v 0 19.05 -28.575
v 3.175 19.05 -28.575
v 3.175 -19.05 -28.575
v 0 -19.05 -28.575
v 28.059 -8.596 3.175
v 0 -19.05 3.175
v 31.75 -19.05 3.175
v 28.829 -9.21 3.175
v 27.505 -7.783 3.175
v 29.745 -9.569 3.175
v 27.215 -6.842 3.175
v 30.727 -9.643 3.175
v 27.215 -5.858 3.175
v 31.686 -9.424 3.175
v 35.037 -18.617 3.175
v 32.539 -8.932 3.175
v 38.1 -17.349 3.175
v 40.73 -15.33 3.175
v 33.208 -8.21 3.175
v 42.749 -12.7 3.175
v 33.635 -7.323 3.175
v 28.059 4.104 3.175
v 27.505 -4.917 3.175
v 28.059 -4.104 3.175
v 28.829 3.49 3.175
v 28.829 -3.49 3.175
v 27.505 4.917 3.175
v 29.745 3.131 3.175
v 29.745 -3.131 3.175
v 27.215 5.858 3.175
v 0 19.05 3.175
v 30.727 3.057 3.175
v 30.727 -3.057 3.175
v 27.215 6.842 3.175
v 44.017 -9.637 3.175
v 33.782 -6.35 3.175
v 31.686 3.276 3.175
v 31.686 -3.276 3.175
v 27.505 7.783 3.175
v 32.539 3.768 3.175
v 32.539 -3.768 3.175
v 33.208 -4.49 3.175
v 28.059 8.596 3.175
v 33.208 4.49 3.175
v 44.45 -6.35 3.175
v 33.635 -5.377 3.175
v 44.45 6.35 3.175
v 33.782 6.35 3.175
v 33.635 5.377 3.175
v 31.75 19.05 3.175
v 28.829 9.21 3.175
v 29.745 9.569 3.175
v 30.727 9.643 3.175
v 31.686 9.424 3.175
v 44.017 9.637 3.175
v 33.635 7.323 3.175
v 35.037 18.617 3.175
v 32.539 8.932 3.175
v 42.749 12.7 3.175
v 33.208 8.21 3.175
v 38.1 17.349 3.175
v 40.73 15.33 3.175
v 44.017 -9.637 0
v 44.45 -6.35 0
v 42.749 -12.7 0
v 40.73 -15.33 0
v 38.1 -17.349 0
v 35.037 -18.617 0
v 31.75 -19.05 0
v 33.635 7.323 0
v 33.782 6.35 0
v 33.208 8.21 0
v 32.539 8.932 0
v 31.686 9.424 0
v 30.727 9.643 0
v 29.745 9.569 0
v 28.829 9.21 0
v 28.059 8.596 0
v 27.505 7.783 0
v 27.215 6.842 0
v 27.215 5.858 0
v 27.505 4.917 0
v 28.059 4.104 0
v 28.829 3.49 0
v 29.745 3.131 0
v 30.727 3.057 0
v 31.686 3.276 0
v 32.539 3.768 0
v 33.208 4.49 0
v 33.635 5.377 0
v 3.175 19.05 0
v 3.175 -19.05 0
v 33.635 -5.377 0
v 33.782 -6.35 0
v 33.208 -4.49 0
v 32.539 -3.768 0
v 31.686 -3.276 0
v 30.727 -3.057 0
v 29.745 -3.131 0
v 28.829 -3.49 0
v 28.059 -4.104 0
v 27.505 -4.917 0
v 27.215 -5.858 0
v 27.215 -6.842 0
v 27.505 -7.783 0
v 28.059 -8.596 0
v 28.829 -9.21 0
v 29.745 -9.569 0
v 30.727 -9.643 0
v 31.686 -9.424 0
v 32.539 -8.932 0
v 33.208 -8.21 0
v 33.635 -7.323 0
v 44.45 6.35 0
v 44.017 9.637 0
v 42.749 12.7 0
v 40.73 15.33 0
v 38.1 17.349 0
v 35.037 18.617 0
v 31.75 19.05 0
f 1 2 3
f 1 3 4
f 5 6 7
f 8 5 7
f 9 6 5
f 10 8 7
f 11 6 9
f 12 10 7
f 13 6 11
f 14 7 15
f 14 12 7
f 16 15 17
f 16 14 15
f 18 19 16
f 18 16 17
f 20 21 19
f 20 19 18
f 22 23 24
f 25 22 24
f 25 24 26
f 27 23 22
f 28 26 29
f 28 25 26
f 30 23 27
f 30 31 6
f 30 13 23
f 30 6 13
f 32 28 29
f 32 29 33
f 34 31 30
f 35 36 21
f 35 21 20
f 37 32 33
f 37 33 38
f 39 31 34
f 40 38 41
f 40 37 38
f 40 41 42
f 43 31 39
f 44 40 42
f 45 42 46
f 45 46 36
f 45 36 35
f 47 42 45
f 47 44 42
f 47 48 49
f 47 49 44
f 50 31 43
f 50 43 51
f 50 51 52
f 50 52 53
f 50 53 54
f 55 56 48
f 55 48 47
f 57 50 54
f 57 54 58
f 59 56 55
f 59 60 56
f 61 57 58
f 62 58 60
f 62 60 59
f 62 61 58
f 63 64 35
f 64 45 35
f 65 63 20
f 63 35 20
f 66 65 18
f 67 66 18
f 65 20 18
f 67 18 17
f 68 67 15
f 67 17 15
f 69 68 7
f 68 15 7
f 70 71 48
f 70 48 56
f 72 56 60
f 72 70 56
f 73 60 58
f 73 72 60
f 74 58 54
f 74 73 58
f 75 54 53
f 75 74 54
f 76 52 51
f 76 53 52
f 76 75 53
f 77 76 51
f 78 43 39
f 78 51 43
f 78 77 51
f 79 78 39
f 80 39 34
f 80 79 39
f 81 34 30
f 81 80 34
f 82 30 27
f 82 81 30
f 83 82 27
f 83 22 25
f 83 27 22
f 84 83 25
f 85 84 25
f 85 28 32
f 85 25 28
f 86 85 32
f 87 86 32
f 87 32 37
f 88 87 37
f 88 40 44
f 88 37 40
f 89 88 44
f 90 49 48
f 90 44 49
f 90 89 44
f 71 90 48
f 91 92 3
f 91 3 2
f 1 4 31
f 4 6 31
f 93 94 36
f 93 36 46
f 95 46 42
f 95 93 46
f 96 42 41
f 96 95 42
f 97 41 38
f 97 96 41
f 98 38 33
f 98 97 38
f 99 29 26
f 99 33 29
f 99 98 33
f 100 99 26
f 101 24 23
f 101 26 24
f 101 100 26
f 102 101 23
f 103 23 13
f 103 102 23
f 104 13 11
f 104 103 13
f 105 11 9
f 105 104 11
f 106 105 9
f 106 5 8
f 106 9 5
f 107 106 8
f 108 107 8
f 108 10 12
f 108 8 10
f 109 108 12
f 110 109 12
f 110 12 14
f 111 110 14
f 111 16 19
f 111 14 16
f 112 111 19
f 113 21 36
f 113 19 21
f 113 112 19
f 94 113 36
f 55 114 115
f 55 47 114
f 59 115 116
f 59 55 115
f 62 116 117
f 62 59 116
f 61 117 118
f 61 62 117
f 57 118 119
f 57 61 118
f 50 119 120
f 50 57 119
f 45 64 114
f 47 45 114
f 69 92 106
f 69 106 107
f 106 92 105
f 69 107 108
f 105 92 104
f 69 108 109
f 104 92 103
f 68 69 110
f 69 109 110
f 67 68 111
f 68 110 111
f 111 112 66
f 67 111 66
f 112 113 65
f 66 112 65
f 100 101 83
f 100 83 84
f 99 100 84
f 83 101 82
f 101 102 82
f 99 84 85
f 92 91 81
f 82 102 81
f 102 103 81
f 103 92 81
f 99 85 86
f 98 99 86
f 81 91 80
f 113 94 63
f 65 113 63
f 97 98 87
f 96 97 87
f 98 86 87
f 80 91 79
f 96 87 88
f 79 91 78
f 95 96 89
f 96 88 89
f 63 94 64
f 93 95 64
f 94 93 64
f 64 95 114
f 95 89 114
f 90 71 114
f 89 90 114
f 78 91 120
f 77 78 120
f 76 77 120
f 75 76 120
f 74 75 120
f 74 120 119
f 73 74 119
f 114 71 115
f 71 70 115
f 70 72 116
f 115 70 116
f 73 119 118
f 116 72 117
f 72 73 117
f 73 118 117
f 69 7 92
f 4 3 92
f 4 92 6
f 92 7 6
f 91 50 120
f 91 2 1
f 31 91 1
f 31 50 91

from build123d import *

# Parameters (mm, degrees)
SKETCH1_W               = 44.45
SKETCH1_H               = 38.1
BOSS_EXTRUDE1_DEPTH     = 3.175
CUT_EXTRUDE1_DEPTH      = 49.464271634
CUT_EXTRUDE1_DEPTH_BACK = 49.464271634
SKETCH2_R               = 3.302
SKETCH3_W               = 3.175
SKETCH3_H               = 38.1
BOSS_EXTRUDE2_DEPTH     = 28.575
FILLET1_R               = 12.7


with BuildPart() as part:
    # Sketch1 → Boss-Extrude1 (new body)
    with BuildSketch(Plane.XY):
        with Locations((22.225, 0)):
            Rectangle(SKETCH1_W, SKETCH1_H)
    extrude(amount=BOSS_EXTRUDE1_DEPTH)

    # Sketch2 → Cut-Extrude1 (cut, two sides: drawn at the far end of the back side and taken through both)
    with BuildSketch(Plane.XY.offset(3.175).offset(-CUT_EXTRUDE1_DEPTH_BACK)):
        with Locations((30.48, 6.35)):
            Circle(SKETCH2_R)
        with Locations((30.48, -6.35)):
            Circle(SKETCH2_R)
    extrude(amount=CUT_EXTRUDE1_DEPTH + CUT_EXTRUDE1_DEPTH_BACK, mode=Mode.SUBTRACT)

    # Sketch3 → Boss-Extrude2 (add)
    with BuildSketch(Plane(origin=(0, 0, 0), x_dir=(-1, 0, 0), z_dir=(0, 0, -1))):
        with Locations((-1.5875, 0)):
            Rectangle(SKETCH3_W, SKETCH3_H)
    extrude(amount=BOSS_EXTRUDE2_DEPTH)

    # Fillet1
    fillet1_edges = [part.edges().sort_by_distance(p)[0] for p in [
        (44.45, 19.05, 1.5875),
        (44.45, -19.05, 1.5875),
    ]]
    fillet(fillet1_edges, radius=FILLET1_R)


solid = part.part
